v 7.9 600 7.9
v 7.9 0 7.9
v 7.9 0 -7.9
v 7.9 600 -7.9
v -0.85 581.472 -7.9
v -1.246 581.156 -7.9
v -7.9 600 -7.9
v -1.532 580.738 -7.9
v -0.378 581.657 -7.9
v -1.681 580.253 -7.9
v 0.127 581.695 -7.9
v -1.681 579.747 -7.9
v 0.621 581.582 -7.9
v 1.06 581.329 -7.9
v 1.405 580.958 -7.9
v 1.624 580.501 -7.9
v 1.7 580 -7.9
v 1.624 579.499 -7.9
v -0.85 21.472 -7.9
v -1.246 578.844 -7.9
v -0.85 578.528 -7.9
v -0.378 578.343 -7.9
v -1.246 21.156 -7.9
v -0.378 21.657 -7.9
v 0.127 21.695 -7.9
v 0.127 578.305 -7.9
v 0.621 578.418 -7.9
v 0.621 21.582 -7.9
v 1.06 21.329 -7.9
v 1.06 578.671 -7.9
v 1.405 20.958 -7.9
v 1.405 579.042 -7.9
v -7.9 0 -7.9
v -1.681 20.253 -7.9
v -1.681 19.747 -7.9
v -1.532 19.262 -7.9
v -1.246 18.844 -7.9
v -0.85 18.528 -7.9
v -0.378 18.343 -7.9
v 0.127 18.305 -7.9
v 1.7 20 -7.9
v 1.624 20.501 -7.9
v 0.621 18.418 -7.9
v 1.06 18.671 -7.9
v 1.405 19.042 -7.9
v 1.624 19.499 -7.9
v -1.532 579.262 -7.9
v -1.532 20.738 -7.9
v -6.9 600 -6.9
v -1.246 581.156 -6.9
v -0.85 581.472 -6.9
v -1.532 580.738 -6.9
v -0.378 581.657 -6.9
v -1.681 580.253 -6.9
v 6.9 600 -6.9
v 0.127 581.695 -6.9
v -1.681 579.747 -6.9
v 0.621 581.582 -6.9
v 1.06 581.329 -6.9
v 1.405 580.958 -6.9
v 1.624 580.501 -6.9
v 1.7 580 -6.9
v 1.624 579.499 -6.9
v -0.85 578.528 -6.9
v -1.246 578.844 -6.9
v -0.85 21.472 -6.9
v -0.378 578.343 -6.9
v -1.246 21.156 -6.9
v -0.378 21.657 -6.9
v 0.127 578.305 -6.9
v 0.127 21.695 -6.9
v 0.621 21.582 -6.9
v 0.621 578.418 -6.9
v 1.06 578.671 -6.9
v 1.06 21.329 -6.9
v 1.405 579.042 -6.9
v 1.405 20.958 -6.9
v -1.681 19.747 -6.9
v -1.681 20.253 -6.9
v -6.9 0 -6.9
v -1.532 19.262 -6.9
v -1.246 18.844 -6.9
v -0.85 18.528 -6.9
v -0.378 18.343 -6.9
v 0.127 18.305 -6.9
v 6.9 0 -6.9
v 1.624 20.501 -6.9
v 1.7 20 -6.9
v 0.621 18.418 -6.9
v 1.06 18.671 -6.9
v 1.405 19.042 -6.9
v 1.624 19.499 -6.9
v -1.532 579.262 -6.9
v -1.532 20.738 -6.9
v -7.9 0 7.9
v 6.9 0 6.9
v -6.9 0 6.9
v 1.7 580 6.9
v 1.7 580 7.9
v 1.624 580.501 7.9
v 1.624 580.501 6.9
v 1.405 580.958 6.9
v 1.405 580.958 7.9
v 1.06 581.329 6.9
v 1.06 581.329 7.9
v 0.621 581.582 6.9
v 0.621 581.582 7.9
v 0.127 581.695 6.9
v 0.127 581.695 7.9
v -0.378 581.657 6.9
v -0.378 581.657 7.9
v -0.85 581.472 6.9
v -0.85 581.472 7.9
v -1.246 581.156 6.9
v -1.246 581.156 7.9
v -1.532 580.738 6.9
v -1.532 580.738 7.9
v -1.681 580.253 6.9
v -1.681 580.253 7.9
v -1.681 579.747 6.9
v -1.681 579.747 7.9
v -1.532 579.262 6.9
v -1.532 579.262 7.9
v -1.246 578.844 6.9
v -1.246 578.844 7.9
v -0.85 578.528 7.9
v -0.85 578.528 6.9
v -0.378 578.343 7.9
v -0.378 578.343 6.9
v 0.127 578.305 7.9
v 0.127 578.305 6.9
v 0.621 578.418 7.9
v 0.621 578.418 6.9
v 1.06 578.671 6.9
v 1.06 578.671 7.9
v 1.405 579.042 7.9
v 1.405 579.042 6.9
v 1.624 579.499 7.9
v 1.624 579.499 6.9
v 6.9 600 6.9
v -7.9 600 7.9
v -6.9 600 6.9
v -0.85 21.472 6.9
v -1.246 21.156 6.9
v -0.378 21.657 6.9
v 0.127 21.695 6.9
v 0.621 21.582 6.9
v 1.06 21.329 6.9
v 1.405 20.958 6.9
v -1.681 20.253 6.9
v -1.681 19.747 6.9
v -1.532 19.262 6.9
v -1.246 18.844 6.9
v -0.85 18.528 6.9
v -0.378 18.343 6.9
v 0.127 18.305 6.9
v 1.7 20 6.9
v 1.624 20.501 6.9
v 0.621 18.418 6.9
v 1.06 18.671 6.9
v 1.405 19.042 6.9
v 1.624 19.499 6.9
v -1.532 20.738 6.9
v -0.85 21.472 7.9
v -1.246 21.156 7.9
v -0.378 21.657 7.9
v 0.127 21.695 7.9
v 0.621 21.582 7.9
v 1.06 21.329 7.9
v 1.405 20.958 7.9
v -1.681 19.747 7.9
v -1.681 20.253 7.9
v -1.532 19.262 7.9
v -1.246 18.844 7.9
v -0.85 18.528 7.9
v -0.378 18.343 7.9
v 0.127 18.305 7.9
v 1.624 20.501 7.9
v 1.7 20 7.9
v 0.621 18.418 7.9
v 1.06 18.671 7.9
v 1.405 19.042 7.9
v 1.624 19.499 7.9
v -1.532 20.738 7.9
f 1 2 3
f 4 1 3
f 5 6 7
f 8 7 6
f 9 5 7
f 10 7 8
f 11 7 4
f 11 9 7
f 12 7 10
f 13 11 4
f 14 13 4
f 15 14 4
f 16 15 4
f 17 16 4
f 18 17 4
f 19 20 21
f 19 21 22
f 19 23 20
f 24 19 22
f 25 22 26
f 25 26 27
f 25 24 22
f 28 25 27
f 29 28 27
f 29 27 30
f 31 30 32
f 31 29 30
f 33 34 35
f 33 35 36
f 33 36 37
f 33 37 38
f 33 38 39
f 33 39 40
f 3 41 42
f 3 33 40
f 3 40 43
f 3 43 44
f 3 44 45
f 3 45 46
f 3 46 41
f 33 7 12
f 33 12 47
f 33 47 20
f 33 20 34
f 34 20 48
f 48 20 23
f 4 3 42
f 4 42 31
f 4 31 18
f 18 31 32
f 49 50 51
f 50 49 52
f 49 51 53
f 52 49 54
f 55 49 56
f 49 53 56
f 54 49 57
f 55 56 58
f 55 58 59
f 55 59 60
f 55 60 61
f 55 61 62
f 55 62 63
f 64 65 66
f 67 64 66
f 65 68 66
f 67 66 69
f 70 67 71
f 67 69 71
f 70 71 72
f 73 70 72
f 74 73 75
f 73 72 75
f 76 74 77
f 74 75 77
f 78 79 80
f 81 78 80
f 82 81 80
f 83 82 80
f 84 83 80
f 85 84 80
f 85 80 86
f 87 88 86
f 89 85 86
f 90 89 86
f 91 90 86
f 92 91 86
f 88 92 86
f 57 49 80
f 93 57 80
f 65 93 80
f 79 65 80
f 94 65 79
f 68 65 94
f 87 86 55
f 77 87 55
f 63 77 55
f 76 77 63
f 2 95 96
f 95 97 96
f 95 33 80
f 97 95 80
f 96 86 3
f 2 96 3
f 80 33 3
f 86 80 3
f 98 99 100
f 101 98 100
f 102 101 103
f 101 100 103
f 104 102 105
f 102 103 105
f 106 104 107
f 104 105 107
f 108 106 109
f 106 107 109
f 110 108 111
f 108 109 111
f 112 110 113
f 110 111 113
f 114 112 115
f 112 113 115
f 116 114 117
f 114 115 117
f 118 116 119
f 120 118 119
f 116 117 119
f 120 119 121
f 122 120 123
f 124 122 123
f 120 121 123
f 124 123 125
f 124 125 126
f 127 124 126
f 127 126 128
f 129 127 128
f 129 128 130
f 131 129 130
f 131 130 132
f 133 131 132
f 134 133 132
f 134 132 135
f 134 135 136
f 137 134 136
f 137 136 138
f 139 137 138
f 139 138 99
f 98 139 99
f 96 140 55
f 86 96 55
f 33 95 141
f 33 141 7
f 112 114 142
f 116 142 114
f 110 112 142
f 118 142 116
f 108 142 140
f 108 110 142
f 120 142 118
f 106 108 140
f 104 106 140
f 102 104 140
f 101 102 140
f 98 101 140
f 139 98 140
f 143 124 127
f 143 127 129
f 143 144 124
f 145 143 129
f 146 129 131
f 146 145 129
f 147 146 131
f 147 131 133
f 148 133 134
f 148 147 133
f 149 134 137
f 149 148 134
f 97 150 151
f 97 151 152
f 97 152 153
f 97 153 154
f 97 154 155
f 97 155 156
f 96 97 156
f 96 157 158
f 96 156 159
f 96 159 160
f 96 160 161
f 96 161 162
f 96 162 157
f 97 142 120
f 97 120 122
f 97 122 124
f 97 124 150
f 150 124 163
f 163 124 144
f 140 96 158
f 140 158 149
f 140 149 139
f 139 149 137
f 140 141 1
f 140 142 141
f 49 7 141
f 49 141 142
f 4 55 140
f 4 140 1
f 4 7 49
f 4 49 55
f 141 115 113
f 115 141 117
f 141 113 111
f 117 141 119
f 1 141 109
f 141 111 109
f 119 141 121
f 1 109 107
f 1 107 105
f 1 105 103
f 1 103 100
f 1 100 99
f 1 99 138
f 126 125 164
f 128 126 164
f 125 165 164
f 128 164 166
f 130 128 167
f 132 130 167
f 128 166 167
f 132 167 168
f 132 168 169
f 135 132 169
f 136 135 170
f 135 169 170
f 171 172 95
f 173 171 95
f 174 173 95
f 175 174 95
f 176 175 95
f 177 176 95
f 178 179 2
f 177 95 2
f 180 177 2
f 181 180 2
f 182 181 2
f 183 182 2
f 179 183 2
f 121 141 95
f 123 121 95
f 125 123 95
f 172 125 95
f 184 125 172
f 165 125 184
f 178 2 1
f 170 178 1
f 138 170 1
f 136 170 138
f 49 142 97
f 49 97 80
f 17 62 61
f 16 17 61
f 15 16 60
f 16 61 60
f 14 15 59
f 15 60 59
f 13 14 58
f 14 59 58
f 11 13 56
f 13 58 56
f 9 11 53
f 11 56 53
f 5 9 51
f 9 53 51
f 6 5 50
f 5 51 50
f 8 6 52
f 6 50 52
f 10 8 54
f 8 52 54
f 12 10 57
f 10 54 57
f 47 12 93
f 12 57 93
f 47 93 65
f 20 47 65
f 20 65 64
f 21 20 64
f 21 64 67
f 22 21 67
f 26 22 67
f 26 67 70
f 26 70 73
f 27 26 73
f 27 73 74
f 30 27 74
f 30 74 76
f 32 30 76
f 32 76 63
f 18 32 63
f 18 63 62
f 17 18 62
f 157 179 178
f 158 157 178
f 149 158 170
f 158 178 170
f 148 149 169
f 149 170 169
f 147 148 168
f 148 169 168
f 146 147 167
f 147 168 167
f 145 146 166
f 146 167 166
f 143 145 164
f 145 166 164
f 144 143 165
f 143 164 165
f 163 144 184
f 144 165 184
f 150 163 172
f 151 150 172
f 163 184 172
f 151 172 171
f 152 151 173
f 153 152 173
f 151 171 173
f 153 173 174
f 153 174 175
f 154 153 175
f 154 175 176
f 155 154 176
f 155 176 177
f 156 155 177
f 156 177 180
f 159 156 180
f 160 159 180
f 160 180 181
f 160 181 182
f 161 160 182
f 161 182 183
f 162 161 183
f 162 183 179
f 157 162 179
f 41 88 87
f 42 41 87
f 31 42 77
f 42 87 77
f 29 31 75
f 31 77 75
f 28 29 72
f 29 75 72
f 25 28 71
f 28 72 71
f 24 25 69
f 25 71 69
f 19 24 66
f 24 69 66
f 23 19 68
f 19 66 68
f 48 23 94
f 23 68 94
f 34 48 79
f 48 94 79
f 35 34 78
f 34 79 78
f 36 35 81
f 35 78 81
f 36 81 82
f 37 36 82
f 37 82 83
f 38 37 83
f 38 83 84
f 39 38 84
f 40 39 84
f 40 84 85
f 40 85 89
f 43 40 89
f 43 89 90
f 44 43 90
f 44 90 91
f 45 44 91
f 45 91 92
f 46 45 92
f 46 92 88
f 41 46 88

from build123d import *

# Parameters (mm, degrees)
SKETCH1_W           = 15.8
SKETCH1_H           = 15.8
SKETCH1_W_2         = 13.8
SKETCH1_H_2         = 13.8
BOSS_EXTRUDE1_DEPTH = 600
SKETCH3_R           = 1.7
CUT_EXTRUDE2_DEPTH  = 601.25998534


with BuildPart() as part:
    # Sketch1 → Boss-Extrude1 (new body)
    with BuildSketch(Plane(origin=(0, 0, 0), x_dir=(1, 0, 0), z_dir=(0, 1, 0))):
        Rectangle(SKETCH1_W, SKETCH1_H)
        Rectangle(SKETCH1_W_2, SKETCH1_H_2, mode=Mode.SUBTRACT)
    extrude(amount=BOSS_EXTRUDE1_DEPTH)

    # Sketch3 → Cut-Extrude2 (cut, through all)
    with BuildSketch(Plane.XY.offset(7.9)):
        with Locations((0, 580)):
            Circle(SKETCH3_R)
        with Locations((0, 20)):
            Circle(SKETCH3_R)
    extrude(amount=-CUT_EXTRUDE2_DEPTH, mode=Mode.SUBTRACT)


solid = part.part
